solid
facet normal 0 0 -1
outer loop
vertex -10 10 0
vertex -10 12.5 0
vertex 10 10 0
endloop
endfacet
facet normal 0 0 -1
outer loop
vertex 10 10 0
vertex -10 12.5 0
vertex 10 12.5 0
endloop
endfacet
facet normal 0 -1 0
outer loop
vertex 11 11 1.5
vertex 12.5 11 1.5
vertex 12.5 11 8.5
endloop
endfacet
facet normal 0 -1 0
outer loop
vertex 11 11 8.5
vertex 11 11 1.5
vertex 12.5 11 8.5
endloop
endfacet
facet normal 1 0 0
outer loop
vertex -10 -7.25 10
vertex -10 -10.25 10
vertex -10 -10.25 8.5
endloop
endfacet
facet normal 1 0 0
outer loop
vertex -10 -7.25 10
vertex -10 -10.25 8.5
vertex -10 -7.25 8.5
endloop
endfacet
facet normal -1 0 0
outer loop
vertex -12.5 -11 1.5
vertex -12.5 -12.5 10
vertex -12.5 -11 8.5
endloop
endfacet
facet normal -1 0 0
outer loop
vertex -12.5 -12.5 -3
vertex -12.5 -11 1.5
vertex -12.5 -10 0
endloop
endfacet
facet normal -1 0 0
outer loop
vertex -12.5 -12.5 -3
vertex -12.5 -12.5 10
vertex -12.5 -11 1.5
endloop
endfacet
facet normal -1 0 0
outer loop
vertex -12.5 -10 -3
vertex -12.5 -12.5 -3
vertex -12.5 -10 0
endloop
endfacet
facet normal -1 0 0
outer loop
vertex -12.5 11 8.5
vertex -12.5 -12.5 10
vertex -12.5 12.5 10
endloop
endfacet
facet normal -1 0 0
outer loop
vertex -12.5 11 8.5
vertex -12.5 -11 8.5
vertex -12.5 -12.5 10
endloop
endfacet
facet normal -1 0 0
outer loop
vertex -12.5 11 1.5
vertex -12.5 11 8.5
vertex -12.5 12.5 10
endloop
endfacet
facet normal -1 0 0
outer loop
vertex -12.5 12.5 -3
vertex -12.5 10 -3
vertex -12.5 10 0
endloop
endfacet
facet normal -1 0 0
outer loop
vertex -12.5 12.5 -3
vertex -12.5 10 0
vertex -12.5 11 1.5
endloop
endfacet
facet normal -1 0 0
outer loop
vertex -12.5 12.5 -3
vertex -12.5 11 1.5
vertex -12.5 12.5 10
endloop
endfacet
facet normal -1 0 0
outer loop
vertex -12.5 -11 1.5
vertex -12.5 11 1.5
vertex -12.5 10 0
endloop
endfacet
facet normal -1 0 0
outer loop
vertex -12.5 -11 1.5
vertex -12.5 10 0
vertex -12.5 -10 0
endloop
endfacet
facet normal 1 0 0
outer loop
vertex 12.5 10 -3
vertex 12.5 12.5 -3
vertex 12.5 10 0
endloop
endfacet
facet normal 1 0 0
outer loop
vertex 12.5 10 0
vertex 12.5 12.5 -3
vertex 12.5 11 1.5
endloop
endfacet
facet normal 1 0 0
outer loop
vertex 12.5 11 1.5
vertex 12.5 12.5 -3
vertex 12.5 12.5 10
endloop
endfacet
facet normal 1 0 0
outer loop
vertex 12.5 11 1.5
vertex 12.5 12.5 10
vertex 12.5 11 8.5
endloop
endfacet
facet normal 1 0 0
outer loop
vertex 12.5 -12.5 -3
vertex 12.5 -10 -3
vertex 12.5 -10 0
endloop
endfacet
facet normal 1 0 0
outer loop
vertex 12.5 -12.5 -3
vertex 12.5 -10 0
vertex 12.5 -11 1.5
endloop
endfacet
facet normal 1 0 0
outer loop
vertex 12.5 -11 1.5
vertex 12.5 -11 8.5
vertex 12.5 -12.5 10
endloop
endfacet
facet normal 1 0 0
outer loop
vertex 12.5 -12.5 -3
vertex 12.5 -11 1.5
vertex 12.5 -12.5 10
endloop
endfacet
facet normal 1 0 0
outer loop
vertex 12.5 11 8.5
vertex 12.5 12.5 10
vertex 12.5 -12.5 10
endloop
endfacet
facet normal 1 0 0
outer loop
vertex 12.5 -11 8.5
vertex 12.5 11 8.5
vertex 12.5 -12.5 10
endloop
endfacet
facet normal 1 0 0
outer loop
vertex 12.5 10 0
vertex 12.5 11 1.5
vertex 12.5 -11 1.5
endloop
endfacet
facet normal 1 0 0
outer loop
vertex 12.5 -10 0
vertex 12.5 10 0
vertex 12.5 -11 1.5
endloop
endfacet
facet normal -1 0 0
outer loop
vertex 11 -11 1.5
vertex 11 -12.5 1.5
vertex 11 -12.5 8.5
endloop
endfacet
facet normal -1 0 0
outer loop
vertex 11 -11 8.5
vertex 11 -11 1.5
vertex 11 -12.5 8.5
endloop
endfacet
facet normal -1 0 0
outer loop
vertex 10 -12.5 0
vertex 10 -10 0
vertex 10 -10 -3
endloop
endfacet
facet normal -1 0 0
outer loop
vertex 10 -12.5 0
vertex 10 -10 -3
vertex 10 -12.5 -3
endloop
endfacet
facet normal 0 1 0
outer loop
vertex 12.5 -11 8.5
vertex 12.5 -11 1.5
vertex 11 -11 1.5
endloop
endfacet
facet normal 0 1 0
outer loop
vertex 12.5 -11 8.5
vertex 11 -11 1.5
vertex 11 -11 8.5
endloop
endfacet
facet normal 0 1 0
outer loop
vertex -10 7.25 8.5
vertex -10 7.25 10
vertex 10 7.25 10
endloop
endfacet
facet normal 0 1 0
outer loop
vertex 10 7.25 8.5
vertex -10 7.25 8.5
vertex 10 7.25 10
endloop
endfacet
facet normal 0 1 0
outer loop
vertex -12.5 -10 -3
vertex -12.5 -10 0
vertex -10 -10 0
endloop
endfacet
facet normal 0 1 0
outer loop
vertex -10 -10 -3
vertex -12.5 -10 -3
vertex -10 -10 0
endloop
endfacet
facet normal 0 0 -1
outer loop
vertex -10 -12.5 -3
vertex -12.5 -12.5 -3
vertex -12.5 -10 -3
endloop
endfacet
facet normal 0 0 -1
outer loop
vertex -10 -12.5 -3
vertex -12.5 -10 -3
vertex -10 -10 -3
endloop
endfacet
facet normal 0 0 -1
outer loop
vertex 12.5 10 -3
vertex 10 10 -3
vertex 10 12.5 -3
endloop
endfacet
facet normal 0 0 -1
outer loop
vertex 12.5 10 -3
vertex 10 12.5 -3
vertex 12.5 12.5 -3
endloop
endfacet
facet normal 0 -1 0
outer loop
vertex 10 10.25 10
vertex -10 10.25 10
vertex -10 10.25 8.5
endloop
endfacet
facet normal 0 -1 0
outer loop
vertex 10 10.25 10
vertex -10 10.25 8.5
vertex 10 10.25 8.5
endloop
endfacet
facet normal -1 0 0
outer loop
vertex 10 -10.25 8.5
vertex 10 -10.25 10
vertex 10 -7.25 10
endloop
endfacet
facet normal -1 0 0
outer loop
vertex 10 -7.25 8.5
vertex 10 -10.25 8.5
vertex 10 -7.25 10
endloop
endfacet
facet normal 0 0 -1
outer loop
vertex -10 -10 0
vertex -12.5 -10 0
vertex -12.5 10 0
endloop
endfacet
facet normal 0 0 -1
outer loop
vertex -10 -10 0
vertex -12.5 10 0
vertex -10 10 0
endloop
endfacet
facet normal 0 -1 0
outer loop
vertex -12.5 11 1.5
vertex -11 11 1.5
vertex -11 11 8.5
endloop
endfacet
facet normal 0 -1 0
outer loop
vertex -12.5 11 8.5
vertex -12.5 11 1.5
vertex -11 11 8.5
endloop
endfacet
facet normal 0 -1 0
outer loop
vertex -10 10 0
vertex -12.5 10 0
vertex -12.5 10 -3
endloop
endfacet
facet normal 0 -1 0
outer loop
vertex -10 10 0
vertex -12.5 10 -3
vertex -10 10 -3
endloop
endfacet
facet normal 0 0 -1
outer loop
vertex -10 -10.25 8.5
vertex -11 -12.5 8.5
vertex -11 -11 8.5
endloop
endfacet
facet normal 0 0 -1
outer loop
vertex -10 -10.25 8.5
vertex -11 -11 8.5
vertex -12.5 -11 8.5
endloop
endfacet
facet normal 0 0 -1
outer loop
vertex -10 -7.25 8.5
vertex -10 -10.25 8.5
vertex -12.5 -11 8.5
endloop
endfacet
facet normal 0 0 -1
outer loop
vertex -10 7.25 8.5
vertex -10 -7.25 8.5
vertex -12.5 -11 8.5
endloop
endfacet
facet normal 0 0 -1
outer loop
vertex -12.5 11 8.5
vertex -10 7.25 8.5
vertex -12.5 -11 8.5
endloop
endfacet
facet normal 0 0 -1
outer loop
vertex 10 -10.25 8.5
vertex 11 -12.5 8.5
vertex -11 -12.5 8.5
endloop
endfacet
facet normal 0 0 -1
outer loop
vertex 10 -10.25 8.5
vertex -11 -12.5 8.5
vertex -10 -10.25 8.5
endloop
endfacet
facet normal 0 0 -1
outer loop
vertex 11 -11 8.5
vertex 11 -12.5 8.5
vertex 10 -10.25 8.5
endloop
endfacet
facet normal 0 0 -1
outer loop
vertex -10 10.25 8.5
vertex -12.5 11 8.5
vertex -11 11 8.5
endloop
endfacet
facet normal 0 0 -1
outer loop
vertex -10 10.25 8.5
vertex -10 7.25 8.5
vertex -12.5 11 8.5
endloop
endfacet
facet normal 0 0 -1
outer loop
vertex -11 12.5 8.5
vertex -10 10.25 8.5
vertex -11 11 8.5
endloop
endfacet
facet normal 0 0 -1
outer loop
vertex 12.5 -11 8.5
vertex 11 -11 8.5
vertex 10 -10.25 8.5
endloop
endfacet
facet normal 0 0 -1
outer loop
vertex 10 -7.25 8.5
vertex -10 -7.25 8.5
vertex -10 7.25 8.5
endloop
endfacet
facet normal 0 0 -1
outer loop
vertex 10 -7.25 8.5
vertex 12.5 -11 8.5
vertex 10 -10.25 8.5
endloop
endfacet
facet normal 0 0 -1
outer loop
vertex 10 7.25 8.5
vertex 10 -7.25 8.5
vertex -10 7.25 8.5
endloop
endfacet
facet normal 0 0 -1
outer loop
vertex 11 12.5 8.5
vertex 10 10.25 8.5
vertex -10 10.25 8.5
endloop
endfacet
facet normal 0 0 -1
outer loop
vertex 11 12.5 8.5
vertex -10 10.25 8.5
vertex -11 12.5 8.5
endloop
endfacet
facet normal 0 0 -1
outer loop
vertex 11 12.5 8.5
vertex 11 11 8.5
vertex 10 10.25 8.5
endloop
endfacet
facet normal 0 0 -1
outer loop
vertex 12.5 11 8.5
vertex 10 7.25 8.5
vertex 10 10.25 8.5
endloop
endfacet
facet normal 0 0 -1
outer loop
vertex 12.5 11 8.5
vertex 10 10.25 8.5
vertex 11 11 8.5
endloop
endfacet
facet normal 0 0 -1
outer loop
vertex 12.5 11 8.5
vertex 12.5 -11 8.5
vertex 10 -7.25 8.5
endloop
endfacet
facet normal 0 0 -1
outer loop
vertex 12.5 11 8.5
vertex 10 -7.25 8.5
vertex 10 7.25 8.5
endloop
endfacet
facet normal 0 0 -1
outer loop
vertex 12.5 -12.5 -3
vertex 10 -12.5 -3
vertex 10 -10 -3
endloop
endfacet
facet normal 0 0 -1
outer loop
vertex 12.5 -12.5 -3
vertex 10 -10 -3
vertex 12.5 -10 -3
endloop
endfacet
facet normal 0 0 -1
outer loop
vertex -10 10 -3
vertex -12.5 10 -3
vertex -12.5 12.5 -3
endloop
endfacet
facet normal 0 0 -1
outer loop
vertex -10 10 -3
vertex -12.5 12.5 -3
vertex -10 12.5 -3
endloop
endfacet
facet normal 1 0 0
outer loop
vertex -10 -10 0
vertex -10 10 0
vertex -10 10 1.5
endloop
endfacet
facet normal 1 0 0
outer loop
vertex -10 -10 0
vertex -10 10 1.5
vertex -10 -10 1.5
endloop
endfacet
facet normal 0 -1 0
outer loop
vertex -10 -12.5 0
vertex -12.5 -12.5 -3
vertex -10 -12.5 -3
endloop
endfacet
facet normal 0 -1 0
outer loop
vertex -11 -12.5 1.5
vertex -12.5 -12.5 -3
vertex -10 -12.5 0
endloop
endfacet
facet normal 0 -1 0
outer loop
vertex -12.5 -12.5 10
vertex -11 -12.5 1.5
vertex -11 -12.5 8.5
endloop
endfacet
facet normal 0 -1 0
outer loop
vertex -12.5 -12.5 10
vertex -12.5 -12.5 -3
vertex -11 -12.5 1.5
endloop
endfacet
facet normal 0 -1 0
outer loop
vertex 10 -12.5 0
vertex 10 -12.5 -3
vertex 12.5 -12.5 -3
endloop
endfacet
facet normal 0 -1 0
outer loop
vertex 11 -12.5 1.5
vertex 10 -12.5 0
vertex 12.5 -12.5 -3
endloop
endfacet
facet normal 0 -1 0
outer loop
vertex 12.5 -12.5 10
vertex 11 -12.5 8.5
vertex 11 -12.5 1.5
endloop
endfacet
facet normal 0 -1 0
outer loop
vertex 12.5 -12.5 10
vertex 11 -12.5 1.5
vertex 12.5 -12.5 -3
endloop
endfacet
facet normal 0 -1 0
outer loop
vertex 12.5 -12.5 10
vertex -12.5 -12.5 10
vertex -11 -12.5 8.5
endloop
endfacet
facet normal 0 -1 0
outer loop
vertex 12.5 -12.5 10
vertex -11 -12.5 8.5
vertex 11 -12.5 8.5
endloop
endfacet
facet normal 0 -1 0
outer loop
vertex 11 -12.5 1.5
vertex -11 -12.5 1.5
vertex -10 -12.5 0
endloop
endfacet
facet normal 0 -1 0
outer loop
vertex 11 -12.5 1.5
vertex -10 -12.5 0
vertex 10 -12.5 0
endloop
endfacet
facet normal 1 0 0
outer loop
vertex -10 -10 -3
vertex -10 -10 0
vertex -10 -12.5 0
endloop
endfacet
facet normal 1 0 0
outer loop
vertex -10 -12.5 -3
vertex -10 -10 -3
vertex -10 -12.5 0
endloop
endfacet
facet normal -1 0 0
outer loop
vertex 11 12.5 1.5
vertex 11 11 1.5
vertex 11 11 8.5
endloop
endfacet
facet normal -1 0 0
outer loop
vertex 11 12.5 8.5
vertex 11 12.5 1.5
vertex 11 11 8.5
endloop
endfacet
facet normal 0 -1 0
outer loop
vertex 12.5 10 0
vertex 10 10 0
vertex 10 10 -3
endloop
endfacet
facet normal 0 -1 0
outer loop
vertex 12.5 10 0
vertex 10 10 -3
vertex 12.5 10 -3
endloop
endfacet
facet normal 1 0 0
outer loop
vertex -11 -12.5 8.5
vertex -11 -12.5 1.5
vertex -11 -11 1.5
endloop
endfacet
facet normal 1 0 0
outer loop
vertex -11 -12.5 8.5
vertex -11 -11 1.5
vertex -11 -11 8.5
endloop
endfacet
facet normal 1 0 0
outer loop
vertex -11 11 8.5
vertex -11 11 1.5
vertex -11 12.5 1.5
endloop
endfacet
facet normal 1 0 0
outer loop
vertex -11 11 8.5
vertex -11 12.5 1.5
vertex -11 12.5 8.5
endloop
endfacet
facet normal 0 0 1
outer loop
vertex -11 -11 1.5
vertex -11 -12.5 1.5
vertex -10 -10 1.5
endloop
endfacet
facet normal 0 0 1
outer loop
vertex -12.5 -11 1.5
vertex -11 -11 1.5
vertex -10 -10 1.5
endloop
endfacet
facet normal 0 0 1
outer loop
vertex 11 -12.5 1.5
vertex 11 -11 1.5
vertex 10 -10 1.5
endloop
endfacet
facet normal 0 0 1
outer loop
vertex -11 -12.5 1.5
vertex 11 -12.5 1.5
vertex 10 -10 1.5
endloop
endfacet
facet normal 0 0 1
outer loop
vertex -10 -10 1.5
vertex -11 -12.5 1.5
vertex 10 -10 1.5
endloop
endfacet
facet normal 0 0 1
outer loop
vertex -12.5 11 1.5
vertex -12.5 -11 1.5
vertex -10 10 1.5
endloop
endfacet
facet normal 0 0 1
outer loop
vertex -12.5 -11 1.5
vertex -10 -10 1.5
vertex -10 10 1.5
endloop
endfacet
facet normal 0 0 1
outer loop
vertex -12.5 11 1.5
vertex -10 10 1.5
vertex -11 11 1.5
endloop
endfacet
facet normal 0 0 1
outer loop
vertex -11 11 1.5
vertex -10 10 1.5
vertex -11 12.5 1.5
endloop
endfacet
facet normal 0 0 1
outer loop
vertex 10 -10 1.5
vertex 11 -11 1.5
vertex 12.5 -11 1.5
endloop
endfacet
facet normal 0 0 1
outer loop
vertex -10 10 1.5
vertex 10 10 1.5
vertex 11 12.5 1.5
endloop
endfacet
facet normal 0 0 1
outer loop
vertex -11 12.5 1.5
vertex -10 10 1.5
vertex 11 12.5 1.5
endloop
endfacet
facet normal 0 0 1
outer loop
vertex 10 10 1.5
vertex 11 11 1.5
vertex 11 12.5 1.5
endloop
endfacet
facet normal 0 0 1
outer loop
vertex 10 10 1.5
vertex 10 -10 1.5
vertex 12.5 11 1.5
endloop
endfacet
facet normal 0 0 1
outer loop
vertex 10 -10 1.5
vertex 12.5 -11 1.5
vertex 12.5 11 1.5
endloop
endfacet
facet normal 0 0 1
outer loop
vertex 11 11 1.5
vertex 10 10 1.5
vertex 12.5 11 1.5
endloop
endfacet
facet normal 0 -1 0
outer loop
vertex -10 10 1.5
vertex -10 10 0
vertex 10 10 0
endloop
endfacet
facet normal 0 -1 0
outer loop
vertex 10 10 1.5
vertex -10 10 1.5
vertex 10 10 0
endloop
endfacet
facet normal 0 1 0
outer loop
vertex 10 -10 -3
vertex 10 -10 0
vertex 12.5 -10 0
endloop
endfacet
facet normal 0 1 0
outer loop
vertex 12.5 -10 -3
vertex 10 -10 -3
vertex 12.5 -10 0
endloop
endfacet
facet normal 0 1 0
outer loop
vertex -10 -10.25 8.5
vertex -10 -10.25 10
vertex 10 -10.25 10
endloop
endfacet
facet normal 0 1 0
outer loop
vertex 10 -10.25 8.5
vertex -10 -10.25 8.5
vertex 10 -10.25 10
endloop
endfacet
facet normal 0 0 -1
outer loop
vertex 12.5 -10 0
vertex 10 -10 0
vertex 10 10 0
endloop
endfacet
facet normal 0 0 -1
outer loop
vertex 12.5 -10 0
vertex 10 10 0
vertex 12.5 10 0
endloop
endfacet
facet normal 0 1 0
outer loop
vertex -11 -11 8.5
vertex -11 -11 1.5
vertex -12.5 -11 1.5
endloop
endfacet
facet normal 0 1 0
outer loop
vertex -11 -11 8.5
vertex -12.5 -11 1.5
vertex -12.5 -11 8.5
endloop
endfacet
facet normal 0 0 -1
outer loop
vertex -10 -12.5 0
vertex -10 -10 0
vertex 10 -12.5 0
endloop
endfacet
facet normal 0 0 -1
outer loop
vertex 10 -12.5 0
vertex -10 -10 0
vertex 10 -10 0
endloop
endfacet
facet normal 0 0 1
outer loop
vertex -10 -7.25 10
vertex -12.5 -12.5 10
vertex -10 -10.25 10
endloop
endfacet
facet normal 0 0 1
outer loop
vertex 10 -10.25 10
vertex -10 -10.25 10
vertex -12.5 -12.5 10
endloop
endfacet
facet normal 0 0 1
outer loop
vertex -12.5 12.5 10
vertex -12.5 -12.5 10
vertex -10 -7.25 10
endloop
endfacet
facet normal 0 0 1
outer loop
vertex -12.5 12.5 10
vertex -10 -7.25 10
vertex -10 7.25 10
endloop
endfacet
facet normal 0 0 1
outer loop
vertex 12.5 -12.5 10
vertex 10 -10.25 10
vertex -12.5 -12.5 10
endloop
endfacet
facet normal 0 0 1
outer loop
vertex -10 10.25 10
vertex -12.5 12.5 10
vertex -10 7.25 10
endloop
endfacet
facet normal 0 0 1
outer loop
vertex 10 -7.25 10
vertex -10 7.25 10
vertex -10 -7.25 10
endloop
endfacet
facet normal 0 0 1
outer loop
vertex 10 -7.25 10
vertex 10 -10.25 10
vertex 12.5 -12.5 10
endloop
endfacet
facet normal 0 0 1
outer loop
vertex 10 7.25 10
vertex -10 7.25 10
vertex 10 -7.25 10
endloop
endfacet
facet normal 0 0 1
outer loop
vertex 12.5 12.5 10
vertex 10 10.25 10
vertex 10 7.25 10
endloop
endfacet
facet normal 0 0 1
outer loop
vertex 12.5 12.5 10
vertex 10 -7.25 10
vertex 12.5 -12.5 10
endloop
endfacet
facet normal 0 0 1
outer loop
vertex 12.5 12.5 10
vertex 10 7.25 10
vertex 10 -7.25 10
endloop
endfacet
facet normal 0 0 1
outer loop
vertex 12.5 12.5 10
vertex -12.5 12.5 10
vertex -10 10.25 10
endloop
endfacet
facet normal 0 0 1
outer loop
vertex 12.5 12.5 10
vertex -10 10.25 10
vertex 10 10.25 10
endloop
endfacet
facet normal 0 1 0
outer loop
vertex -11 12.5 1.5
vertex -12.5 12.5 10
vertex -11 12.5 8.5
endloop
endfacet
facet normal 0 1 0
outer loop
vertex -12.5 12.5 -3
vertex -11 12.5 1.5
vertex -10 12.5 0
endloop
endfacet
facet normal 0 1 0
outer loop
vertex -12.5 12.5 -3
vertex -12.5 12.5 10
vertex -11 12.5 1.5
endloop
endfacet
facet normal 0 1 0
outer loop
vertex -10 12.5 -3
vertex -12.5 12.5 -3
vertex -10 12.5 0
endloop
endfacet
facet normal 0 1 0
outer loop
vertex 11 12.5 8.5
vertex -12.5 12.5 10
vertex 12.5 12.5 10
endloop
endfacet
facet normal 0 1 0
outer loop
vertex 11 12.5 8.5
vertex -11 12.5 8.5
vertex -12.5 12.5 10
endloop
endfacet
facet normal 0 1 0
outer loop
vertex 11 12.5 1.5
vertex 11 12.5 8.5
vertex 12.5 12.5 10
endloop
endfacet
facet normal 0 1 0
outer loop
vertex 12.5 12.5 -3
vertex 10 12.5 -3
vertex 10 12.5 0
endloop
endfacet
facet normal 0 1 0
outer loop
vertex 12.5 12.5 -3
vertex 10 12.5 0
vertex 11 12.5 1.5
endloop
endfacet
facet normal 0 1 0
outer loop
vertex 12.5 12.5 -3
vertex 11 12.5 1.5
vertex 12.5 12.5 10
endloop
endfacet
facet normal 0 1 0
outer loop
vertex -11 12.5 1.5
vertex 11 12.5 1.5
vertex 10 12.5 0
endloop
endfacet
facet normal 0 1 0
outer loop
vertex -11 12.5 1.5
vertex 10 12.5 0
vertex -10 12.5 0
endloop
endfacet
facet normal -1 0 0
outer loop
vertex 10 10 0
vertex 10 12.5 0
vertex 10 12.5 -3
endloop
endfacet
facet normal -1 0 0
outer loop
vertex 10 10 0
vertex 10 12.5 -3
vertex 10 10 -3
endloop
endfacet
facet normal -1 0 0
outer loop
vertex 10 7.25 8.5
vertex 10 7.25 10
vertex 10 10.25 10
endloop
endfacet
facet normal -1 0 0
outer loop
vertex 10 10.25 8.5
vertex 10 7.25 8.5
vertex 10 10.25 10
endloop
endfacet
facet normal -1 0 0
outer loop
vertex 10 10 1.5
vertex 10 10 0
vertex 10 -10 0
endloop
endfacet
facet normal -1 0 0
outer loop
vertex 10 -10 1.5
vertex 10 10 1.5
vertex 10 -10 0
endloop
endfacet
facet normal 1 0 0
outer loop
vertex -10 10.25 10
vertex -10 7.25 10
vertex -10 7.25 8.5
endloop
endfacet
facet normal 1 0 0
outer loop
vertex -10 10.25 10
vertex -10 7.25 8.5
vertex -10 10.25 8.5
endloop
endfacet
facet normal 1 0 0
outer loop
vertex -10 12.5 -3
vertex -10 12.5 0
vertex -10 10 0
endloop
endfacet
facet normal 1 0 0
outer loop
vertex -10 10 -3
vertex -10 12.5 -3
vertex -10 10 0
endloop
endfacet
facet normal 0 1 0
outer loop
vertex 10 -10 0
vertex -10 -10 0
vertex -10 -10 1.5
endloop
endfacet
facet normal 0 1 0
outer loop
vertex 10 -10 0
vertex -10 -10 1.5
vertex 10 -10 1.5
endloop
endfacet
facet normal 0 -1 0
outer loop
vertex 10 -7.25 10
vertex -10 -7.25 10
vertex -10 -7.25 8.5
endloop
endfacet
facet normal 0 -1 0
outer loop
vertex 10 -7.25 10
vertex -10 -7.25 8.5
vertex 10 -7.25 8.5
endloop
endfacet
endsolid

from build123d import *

# Parameters (mm, degrees)
F0_W      = 25
F0_H      = 25
F1_DEPTH  = 10
F5_W      = 22
F5_H      = 7
F6_DEPTH  = 25
F7_W      = 22
F7_H      = 7
F8_DEPTH  = 25
F9_W      = 20
F9_H      = 20
F10_DEPTH = 5
F11_W     = 2.5
F11_H     = 2.5
F12_DEPTH = 3
F3_W      = 20
F3_H      = 3
F13_DEPTH = 5


with BuildPart() as f1:
    # F0 (on Top) → F1 (new body)
    with BuildSketch(Plane.XY):
        Rectangle(F0_W, F0_H)
    extrude(amount=F1_DEPTH)

    # F5 (on face) → F6 (cut)
    with BuildSketch(Plane.XZ.offset(12.5)):
        with Locations((0, 5)):
            Rectangle(F5_W, F5_H)
    extrude(amount=-F6_DEPTH, mode=Mode.SUBTRACT)

    # F7 (on face) → F8 (cut)
    with BuildSketch(Plane.YZ.offset(12.5)):
        with Locations((0, 5)):
            Rectangle(F7_W, F7_H)
    extrude(amount=-F8_DEPTH, mode=Mode.SUBTRACT)

    # F9 (on face) → F10 (cut)
    with BuildSketch(Plane(origin=(0, 0, 0), x_dir=(1, 0, 0), z_dir=(0, 0, -1))):
        Rectangle(F9_W, F9_H)
    extrude(amount=-F10_DEPTH, mode=Mode.SUBTRACT)

    # F11 (on face) → F12 (join)
    with BuildSketch(Plane(origin=(0, 0, 0), x_dir=(1, 0, 0), z_dir=(0, 0, -1))):
        with Locations((11.25, 11.25)):
            Rectangle(F11_W, F11_H)
        with Locations((-11.25, 11.25)):
            Rectangle(F11_W, F11_H)
        with Locations((-11.25, -11.25)):
            Rectangle(F11_W, F11_H)
        with Locations((11.25, -11.25)):
            Rectangle(F11_W, F11_H)
    extrude(amount=F12_DEPTH)

    # F3 (on face) → F13 (cut)
    with BuildSketch(Plane.XY.offset(10)):
        with Locations((0, -8.75)):
            Rectangle(F3_W, F3_H)
        with Locations((0, 8.75)):
            Rectangle(F3_W, F3_H)
    extrude(amount=-F13_DEPTH, mode=Mode.SUBTRACT)


solid = f1.part
